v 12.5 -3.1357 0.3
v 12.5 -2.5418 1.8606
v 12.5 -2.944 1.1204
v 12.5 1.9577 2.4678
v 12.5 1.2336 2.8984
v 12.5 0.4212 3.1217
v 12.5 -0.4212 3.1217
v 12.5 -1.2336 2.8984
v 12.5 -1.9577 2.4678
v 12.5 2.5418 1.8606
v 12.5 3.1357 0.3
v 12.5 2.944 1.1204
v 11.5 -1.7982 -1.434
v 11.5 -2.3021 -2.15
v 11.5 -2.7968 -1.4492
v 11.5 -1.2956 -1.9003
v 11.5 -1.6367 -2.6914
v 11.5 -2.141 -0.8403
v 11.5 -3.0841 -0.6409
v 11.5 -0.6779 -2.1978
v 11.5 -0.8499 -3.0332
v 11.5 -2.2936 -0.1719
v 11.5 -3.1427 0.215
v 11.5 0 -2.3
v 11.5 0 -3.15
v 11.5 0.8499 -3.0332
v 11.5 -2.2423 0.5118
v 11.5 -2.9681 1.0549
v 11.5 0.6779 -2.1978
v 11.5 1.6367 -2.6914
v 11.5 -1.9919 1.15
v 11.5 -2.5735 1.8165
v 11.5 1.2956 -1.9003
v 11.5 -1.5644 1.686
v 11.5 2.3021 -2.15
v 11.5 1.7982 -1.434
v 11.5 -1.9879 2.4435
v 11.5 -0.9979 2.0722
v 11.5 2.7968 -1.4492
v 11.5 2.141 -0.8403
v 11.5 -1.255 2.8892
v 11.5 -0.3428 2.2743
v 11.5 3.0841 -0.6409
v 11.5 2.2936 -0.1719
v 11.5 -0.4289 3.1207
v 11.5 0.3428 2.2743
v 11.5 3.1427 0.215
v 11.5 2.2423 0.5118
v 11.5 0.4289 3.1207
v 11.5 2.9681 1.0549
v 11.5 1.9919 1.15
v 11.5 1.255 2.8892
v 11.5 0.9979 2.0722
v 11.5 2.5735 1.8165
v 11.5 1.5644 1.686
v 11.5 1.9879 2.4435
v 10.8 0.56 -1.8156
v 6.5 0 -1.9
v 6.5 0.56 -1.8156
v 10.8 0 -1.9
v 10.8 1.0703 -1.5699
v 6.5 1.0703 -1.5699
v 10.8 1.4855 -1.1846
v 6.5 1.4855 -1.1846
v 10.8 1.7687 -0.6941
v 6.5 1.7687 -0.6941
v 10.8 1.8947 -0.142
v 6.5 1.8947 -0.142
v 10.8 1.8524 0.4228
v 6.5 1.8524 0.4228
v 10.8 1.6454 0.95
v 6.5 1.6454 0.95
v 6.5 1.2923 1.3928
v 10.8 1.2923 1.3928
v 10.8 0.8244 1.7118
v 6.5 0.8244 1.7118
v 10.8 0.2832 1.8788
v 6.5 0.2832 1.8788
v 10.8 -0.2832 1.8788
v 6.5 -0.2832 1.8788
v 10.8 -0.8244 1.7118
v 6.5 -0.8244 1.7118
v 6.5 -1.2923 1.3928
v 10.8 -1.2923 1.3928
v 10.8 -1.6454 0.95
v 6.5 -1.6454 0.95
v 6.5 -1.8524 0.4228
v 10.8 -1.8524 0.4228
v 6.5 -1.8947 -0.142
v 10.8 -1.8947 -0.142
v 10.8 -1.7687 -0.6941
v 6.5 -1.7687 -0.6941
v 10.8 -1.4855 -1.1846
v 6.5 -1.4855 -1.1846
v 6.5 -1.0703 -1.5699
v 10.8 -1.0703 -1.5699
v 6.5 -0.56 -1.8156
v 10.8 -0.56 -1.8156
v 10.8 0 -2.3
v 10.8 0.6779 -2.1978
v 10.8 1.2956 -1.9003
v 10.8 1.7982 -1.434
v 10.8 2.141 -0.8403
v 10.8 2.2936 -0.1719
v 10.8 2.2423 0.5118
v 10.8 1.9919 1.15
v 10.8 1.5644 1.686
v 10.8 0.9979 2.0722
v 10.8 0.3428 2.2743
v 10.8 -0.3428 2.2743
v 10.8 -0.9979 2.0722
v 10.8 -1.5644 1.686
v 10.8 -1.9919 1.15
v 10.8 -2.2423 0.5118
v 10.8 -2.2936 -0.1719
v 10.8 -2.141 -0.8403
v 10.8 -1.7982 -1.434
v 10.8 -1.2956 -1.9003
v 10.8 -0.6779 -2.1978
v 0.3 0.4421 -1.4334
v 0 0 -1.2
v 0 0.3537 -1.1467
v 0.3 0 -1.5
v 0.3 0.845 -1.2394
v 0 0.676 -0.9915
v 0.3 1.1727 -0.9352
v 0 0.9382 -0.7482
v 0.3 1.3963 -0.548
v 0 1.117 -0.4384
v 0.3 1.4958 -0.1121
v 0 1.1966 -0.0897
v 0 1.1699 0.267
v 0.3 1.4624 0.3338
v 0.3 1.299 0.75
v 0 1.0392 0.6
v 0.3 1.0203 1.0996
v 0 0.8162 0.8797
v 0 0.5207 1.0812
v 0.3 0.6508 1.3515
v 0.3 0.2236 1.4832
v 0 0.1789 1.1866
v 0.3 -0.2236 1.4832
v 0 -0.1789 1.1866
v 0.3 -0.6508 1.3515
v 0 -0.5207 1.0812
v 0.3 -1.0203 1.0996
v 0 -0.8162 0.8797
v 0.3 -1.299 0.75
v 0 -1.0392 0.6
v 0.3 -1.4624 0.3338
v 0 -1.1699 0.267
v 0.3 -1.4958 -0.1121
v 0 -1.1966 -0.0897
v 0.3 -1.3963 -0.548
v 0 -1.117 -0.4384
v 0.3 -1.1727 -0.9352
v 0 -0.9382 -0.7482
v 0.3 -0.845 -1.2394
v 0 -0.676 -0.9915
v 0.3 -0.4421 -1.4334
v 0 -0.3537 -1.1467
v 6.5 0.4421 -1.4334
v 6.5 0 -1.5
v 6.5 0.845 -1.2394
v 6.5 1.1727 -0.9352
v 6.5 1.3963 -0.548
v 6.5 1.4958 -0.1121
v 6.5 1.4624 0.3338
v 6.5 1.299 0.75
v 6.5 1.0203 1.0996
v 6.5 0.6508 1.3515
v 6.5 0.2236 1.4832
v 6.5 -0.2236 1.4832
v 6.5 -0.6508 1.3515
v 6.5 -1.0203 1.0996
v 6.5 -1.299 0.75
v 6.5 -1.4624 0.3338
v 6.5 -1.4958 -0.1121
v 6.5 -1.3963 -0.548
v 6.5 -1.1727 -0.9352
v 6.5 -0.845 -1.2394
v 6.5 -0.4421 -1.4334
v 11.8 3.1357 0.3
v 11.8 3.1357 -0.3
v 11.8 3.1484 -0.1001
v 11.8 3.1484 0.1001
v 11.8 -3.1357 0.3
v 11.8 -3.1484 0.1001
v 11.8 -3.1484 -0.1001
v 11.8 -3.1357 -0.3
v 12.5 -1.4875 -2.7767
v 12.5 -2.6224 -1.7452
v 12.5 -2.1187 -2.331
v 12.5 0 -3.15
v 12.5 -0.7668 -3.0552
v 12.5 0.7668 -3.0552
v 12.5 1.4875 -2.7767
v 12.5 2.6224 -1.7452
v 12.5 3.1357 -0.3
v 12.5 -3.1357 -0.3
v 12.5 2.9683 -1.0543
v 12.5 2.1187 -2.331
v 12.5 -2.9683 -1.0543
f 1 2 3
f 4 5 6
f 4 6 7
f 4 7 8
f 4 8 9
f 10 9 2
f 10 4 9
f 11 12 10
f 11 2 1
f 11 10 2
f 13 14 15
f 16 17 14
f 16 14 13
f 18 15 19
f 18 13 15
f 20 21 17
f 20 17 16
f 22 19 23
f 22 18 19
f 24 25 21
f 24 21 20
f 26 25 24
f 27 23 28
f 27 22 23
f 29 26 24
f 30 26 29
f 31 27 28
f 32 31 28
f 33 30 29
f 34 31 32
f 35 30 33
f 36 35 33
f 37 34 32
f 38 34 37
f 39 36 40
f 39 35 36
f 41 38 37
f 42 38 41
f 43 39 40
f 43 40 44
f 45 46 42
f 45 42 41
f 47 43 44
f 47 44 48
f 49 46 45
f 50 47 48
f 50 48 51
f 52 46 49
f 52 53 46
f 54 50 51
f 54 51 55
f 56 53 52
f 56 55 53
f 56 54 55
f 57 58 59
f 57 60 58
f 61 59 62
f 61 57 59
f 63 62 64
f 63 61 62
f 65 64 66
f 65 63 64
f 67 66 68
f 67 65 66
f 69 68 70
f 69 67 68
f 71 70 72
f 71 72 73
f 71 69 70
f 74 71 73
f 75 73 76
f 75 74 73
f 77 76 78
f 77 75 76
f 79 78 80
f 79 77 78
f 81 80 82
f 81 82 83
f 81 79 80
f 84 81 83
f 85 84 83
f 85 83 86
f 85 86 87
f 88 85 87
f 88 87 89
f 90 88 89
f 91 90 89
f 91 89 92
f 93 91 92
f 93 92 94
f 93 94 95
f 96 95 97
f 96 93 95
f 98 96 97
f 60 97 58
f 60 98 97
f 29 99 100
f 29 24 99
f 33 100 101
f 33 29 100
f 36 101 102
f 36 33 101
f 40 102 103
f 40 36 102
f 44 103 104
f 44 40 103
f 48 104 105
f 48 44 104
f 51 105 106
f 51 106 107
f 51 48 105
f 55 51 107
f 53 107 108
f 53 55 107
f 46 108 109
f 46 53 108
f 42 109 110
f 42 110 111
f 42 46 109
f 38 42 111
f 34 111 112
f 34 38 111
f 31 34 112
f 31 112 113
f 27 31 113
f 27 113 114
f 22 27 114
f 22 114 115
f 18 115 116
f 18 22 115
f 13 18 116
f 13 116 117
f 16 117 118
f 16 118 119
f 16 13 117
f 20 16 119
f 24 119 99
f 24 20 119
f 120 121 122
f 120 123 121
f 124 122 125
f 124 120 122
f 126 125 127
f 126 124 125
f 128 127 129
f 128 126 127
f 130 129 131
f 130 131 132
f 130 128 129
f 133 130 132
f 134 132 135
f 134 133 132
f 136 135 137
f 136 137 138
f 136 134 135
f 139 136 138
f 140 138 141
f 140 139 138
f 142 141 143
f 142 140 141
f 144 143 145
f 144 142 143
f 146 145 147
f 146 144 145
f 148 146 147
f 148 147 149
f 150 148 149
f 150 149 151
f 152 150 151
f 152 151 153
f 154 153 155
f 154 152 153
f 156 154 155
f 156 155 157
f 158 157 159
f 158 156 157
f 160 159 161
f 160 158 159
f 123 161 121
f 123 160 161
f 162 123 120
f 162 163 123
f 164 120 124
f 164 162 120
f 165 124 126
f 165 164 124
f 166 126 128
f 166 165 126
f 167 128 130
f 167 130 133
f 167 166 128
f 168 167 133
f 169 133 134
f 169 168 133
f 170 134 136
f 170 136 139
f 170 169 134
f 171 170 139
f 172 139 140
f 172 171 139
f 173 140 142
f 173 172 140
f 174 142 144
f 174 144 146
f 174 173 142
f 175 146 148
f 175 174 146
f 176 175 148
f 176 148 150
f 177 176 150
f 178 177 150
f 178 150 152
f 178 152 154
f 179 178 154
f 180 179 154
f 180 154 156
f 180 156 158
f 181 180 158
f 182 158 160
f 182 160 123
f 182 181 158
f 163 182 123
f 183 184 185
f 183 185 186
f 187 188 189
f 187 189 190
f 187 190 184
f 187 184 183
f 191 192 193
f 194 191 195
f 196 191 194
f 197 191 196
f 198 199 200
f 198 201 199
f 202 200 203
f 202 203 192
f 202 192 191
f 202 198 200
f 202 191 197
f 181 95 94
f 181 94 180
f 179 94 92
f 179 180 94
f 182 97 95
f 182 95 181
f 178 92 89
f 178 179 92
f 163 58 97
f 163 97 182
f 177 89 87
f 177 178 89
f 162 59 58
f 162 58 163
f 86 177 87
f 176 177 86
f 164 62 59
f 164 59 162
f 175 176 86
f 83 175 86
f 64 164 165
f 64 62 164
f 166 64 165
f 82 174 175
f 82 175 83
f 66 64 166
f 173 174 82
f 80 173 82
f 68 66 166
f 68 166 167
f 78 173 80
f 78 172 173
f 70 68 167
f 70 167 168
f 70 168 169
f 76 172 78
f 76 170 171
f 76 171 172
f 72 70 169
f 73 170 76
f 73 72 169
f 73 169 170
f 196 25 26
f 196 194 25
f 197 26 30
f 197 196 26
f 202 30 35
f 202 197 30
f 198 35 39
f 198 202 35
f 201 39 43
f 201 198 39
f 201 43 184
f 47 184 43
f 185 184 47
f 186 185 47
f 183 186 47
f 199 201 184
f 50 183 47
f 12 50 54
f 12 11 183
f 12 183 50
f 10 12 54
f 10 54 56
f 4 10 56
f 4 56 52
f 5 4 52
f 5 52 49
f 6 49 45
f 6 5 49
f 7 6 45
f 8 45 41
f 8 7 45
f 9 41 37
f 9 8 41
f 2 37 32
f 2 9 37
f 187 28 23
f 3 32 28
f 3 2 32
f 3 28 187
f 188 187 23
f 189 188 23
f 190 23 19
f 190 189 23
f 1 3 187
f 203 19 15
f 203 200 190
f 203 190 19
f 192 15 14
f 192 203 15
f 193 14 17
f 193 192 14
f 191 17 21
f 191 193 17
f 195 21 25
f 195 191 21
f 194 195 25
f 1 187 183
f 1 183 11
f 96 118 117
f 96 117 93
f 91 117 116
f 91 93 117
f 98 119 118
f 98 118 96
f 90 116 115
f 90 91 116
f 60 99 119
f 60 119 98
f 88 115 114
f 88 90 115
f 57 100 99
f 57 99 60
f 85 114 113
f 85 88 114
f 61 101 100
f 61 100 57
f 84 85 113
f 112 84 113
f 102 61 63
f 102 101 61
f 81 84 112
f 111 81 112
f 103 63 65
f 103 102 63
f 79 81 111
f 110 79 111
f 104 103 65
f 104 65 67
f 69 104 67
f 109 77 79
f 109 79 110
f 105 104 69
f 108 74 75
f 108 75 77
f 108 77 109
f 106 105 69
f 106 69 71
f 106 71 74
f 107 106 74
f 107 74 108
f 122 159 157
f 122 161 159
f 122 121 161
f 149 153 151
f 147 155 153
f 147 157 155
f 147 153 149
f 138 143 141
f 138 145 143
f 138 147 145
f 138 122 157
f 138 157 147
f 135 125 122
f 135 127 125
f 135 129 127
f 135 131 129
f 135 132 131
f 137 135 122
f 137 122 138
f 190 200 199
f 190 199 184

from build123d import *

# Parameters (mm, degrees)
CUT_EXTRUDE_1_DEPTH      = 4.15
CUT_EXTRUDE_1_DEPTH_BACK = 4.15


with BuildPart() as part:
    # Эскиз1 → Повернуть1 (revolve)
    with BuildSketch(Plane(origin=(0, 0, 0), x_dir=(1, 0, 0), z_dir=(0, 1, 0))):
        Polygon((0, 0), (0, 1.2), (0.3, 1.5), (6.5, 1.5), (6.5, 1.9), (10.8, 1.9), (10.8, 2.3), (11.5, 2.3), (11.5, 3.15), (12.5, 3.15), (12.5, 0), align=None)
    revolve(axis=Axis((-1.842251792, 0, 0), (1, 0, 0)))

    # Эскиз2 → Вырез-Вытянуть1 (cut, two sides)
    with BuildSketch(Plane(origin=(0, 0, 0), x_dir=(1, 0, 0), z_dir=(0, 1, 0))) as cut_extrude_1_sk:
        Polygon((48.434725755, 0.3), (12.5, 0.3), (11.8, 0.3), (11.8, -0.3), (12.5, -0.3), (48.434725755, -0.3), (120.304177266, -0.3), (120.304177266, 0.3), align=None)
    extrude(amount=CUT_EXTRUDE_1_DEPTH, mode=Mode.SUBTRACT)
    extrude(cut_extrude_1_sk.sketch, amount=-CUT_EXTRUDE_1_DEPTH_BACK, mode=Mode.SUBTRACT)


solid = part.part
